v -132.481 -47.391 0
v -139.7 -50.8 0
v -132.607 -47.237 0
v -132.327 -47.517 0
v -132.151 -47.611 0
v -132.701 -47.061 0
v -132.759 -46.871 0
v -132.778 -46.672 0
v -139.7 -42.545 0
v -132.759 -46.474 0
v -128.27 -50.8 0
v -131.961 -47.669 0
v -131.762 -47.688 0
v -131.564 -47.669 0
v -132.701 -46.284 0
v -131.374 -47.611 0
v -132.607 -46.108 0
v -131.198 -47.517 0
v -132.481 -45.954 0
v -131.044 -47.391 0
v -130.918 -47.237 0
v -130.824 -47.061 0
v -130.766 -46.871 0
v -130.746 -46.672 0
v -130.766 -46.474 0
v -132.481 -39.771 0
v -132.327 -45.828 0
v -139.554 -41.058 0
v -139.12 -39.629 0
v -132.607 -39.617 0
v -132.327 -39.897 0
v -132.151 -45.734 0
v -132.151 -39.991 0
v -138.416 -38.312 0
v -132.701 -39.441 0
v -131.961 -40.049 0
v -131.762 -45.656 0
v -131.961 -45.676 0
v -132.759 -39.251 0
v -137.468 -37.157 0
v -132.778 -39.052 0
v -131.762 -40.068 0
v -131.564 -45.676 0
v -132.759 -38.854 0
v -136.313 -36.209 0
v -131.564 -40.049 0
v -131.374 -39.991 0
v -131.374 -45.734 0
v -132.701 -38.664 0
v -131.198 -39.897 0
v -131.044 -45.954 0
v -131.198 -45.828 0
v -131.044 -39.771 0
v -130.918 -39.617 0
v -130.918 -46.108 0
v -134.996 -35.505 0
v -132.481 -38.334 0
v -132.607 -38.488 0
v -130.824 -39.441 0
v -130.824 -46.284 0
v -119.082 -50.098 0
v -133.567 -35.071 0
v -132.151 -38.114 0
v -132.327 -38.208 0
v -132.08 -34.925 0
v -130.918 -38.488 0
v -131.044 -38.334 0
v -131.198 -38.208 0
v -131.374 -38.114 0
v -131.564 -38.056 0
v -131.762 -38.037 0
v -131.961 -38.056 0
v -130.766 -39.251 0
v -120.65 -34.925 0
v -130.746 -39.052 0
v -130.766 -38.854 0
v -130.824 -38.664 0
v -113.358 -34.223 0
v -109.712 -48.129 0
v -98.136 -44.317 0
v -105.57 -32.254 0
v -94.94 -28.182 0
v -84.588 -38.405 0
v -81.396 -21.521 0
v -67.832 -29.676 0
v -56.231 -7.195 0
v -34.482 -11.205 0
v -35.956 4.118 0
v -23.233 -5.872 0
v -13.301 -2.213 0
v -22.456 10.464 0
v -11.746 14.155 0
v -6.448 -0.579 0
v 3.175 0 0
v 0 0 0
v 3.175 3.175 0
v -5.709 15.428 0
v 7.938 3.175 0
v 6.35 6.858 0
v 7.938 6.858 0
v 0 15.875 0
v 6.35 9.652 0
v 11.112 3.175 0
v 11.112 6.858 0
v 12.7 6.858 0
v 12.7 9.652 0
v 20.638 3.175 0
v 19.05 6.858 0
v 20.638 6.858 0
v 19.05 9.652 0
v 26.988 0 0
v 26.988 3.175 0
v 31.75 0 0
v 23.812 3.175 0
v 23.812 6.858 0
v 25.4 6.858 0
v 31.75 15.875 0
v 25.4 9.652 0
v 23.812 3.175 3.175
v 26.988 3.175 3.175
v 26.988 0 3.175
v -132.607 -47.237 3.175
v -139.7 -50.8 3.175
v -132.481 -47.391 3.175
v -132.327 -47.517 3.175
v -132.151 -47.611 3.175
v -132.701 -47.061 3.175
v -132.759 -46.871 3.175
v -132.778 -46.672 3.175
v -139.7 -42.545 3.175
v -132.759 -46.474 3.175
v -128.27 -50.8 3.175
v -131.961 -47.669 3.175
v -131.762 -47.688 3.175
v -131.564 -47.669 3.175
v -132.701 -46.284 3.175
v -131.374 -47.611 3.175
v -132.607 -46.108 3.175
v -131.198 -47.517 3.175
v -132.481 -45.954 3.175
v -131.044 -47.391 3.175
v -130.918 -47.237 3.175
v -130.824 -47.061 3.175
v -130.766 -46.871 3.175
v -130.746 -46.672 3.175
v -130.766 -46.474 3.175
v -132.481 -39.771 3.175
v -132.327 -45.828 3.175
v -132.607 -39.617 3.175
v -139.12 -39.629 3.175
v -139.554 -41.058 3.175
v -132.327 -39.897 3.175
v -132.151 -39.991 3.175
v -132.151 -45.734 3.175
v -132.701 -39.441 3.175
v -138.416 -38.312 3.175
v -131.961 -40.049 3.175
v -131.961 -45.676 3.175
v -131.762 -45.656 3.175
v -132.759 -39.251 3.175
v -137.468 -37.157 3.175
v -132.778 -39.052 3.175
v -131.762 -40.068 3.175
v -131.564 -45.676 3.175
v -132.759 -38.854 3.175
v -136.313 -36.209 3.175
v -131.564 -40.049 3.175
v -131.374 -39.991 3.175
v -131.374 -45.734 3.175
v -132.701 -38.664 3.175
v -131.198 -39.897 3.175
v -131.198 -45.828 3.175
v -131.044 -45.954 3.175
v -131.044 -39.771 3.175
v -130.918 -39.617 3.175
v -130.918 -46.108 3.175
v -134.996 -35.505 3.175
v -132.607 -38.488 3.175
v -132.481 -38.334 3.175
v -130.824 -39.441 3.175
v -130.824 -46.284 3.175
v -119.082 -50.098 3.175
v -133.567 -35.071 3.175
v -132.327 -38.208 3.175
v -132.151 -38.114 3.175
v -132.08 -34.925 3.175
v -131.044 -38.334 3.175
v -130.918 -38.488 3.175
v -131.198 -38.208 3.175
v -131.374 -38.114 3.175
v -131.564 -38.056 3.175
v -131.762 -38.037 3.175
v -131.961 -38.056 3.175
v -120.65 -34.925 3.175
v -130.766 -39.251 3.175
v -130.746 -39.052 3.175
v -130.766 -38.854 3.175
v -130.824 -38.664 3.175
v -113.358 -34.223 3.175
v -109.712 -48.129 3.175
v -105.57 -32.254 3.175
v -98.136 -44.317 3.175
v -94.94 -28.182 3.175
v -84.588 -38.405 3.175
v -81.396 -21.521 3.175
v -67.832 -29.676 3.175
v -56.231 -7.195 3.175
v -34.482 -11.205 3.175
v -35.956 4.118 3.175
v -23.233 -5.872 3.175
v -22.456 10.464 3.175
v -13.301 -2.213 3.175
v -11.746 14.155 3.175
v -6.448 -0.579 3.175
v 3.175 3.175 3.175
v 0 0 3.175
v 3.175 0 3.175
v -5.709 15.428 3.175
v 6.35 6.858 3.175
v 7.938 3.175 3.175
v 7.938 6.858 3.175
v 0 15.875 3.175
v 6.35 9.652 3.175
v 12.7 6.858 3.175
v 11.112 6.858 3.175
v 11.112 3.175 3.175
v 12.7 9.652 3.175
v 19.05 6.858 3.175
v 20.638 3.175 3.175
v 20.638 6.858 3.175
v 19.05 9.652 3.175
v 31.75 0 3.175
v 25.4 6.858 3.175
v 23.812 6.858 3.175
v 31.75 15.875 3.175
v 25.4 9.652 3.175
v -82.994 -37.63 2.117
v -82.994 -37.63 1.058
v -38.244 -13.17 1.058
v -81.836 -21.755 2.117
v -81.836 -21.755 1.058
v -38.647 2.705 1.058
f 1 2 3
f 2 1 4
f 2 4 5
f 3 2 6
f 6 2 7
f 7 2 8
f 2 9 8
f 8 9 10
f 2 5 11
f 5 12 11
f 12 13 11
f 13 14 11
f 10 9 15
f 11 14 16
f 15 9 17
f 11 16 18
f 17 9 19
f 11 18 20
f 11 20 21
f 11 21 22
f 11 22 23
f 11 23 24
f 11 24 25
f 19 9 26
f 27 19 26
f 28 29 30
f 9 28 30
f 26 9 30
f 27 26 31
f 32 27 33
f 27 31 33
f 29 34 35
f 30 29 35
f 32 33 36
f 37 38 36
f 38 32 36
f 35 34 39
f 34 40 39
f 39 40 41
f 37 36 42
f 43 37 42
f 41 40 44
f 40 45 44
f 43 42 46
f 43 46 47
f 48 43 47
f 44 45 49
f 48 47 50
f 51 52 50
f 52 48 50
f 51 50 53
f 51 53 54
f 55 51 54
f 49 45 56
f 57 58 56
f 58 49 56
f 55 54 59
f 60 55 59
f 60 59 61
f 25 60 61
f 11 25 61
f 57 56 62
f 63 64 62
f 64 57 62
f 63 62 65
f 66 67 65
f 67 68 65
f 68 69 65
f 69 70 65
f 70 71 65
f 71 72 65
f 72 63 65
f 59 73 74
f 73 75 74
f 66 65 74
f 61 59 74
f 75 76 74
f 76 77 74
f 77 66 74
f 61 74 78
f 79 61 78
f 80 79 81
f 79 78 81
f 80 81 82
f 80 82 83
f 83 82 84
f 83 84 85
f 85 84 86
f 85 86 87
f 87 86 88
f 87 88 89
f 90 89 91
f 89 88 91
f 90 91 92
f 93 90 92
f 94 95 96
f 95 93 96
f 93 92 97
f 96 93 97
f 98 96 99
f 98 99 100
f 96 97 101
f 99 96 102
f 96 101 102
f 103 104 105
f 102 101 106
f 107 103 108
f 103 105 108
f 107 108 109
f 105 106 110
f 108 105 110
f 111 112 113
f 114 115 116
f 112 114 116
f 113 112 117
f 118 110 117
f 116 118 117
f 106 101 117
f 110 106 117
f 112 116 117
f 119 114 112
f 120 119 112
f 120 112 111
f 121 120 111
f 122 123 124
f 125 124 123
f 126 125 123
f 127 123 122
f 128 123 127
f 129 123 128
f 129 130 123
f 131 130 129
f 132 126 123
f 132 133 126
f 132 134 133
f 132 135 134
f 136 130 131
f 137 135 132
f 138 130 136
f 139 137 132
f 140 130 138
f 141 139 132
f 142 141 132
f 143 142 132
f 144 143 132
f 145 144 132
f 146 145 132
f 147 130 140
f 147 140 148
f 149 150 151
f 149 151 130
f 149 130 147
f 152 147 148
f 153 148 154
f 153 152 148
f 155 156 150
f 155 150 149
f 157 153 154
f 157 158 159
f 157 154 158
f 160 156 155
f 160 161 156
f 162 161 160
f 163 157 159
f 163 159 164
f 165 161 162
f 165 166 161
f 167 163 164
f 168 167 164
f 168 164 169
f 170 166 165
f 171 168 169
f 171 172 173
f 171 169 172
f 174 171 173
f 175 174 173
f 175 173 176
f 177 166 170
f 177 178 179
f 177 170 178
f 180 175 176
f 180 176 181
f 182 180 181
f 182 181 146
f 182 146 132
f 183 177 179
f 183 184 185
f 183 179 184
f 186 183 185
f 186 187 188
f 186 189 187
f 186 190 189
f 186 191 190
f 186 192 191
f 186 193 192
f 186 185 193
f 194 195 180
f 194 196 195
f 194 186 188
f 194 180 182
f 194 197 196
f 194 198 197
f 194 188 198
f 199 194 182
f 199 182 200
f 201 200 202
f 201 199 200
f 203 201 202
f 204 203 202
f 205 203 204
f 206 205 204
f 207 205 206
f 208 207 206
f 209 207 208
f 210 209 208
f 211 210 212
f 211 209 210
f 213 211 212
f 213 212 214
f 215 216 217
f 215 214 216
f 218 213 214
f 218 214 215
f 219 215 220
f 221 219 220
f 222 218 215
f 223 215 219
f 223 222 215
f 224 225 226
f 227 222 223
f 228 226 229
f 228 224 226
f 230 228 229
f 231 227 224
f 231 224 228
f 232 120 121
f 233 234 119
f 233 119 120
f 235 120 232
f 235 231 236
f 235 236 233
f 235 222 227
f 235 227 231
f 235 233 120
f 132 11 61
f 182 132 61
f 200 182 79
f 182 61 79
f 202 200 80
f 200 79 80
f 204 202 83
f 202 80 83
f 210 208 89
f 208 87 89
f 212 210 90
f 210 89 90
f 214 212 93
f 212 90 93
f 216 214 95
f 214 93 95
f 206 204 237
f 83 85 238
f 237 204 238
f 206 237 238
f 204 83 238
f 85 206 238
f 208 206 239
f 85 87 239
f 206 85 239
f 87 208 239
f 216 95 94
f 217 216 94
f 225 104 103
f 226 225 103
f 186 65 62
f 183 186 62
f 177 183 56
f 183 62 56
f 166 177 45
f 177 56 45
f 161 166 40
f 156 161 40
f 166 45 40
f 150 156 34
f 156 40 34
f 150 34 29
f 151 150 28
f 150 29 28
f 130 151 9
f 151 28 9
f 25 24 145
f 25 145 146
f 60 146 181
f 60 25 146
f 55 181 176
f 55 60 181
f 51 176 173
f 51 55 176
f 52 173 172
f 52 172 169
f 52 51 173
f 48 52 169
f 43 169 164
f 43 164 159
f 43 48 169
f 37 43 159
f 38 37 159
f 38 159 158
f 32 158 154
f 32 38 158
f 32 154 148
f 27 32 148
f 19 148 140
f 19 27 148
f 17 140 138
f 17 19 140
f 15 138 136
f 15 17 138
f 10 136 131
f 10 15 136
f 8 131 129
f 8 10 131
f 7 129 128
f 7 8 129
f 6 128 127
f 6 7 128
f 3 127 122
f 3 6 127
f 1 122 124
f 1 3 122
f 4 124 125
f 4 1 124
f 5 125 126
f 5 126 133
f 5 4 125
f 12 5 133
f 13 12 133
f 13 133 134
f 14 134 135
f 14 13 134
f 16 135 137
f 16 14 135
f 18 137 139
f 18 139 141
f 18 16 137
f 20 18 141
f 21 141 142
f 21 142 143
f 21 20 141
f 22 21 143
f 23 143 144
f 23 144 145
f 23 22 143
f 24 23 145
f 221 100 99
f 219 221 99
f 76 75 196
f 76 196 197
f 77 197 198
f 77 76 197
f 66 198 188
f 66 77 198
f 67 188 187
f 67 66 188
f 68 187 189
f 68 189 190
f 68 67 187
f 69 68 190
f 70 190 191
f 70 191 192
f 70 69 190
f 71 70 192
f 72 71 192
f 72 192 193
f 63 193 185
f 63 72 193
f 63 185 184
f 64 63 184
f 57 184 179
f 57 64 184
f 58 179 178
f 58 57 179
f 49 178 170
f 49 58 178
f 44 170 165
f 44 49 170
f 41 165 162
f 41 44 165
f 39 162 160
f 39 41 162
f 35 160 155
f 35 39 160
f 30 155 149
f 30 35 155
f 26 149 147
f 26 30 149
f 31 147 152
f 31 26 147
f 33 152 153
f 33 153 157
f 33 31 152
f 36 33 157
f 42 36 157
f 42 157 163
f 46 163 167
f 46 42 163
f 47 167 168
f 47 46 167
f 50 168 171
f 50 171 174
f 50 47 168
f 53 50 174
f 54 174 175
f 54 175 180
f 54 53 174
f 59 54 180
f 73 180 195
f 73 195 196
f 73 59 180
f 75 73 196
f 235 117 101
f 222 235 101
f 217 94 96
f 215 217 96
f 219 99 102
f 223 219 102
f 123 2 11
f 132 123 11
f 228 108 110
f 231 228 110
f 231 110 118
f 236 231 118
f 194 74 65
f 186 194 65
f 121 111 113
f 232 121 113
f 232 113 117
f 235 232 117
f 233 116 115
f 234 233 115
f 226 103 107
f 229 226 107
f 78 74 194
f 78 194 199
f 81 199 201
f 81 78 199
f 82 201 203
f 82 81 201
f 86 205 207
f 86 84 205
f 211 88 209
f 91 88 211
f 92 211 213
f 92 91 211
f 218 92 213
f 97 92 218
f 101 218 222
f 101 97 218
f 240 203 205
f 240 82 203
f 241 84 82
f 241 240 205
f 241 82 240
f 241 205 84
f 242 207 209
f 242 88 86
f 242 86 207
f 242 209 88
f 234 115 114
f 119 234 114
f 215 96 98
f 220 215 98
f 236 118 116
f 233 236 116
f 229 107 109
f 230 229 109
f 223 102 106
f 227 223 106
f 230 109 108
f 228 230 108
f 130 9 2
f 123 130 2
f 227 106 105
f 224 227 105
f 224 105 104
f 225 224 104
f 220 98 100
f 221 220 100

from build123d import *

# Parameters (mm, degrees)
SKETCH1_R           = 1.016
BOSS_EXTRUDE1_DEPTH = 3.175


with BuildPart() as part:
    # Sketch1 → Boss-Extrude1 (new body)
    with BuildSketch(Plane.XY):
        with BuildLine():
            Line((0, 0), (3.175, 0))
            Line((3.175, 0), (3.175, 3.175))
            Line((3.175, 3.175), (7.9375, 3.175))
            Line((7.9375, 3.175), (7.9375, 6.858))
            Line((7.9375, 6.858), (6.35, 6.858))
            Line((6.35, 6.858), (6.35, 9.652))
            Line((6.35, 9.652), (12.7, 9.652))
            Line((12.7, 9.652), (12.7, 6.858))
            Line((12.7, 6.858), (11.1125, 6.858))
            Line((11.1125, 6.858), (11.1125, 3.175))
            Line((11.1125, 3.175), (20.6375, 3.175))
            Line((20.6375, 3.175), (20.6375, 6.858))
            Line((20.6375, 6.858), (19.05, 6.858))
            Line((19.05, 6.858), (19.05, 9.652))
            Line((19.05, 9.652), (25.4, 9.652))
            Line((25.4, 9.652), (25.4, 6.858))
            Line((25.4, 6.858), (23.8125, 6.858))
            Line((23.8125, 6.858), (23.8125, 3.175))
            Line((23.8125, 3.175), (26.9875, 3.175))
            Line((26.9875, 3.175), (26.9875, 0))
            Line((26.9875, 0), (31.75, 0))
            Line((31.75, 0), (31.75, 15.875))
            Line((31.75, 15.875), (0, 15.875))
            add(Edge.make_bspline(
                [(-120.65, -34.925), (-86.994673616, -34.925), (-33.403901093, 15.875), (0, 15.875)],
                knots=[0, 0, 0, 0, 1, 1, 1, 1], degree=3))
            Line((-120.65, -34.925), (-132.08, -34.925))
            ThreePointArc((-132.08, -34.925), (-137.468153673, -37.156846327), (-139.7, -42.545))
            Line((-139.7, -42.545), (-139.7, -50.8))
            Line((-139.7, -50.8), (-128.27, -50.8))
            add(Edge.make_bspline(
                [(-128.27, -50.8), (-84.724287152, -50.8), (-32.997851809, 0), (0, 0)],
                knots=[0, 0, 0, 0, 1, 1, 1, 1], degree=3))
        make_face()
        with Locations((-131.7625, -39.0525)):
            Circle(SKETCH1_R, mode=Mode.SUBTRACT)
        with Locations((-131.7625, -46.6725)):
            Circle(SKETCH1_R, mode=Mode.SUBTRACT)
    extrude(amount=BOSS_EXTRUDE1_DEPTH)


solid = part.part
